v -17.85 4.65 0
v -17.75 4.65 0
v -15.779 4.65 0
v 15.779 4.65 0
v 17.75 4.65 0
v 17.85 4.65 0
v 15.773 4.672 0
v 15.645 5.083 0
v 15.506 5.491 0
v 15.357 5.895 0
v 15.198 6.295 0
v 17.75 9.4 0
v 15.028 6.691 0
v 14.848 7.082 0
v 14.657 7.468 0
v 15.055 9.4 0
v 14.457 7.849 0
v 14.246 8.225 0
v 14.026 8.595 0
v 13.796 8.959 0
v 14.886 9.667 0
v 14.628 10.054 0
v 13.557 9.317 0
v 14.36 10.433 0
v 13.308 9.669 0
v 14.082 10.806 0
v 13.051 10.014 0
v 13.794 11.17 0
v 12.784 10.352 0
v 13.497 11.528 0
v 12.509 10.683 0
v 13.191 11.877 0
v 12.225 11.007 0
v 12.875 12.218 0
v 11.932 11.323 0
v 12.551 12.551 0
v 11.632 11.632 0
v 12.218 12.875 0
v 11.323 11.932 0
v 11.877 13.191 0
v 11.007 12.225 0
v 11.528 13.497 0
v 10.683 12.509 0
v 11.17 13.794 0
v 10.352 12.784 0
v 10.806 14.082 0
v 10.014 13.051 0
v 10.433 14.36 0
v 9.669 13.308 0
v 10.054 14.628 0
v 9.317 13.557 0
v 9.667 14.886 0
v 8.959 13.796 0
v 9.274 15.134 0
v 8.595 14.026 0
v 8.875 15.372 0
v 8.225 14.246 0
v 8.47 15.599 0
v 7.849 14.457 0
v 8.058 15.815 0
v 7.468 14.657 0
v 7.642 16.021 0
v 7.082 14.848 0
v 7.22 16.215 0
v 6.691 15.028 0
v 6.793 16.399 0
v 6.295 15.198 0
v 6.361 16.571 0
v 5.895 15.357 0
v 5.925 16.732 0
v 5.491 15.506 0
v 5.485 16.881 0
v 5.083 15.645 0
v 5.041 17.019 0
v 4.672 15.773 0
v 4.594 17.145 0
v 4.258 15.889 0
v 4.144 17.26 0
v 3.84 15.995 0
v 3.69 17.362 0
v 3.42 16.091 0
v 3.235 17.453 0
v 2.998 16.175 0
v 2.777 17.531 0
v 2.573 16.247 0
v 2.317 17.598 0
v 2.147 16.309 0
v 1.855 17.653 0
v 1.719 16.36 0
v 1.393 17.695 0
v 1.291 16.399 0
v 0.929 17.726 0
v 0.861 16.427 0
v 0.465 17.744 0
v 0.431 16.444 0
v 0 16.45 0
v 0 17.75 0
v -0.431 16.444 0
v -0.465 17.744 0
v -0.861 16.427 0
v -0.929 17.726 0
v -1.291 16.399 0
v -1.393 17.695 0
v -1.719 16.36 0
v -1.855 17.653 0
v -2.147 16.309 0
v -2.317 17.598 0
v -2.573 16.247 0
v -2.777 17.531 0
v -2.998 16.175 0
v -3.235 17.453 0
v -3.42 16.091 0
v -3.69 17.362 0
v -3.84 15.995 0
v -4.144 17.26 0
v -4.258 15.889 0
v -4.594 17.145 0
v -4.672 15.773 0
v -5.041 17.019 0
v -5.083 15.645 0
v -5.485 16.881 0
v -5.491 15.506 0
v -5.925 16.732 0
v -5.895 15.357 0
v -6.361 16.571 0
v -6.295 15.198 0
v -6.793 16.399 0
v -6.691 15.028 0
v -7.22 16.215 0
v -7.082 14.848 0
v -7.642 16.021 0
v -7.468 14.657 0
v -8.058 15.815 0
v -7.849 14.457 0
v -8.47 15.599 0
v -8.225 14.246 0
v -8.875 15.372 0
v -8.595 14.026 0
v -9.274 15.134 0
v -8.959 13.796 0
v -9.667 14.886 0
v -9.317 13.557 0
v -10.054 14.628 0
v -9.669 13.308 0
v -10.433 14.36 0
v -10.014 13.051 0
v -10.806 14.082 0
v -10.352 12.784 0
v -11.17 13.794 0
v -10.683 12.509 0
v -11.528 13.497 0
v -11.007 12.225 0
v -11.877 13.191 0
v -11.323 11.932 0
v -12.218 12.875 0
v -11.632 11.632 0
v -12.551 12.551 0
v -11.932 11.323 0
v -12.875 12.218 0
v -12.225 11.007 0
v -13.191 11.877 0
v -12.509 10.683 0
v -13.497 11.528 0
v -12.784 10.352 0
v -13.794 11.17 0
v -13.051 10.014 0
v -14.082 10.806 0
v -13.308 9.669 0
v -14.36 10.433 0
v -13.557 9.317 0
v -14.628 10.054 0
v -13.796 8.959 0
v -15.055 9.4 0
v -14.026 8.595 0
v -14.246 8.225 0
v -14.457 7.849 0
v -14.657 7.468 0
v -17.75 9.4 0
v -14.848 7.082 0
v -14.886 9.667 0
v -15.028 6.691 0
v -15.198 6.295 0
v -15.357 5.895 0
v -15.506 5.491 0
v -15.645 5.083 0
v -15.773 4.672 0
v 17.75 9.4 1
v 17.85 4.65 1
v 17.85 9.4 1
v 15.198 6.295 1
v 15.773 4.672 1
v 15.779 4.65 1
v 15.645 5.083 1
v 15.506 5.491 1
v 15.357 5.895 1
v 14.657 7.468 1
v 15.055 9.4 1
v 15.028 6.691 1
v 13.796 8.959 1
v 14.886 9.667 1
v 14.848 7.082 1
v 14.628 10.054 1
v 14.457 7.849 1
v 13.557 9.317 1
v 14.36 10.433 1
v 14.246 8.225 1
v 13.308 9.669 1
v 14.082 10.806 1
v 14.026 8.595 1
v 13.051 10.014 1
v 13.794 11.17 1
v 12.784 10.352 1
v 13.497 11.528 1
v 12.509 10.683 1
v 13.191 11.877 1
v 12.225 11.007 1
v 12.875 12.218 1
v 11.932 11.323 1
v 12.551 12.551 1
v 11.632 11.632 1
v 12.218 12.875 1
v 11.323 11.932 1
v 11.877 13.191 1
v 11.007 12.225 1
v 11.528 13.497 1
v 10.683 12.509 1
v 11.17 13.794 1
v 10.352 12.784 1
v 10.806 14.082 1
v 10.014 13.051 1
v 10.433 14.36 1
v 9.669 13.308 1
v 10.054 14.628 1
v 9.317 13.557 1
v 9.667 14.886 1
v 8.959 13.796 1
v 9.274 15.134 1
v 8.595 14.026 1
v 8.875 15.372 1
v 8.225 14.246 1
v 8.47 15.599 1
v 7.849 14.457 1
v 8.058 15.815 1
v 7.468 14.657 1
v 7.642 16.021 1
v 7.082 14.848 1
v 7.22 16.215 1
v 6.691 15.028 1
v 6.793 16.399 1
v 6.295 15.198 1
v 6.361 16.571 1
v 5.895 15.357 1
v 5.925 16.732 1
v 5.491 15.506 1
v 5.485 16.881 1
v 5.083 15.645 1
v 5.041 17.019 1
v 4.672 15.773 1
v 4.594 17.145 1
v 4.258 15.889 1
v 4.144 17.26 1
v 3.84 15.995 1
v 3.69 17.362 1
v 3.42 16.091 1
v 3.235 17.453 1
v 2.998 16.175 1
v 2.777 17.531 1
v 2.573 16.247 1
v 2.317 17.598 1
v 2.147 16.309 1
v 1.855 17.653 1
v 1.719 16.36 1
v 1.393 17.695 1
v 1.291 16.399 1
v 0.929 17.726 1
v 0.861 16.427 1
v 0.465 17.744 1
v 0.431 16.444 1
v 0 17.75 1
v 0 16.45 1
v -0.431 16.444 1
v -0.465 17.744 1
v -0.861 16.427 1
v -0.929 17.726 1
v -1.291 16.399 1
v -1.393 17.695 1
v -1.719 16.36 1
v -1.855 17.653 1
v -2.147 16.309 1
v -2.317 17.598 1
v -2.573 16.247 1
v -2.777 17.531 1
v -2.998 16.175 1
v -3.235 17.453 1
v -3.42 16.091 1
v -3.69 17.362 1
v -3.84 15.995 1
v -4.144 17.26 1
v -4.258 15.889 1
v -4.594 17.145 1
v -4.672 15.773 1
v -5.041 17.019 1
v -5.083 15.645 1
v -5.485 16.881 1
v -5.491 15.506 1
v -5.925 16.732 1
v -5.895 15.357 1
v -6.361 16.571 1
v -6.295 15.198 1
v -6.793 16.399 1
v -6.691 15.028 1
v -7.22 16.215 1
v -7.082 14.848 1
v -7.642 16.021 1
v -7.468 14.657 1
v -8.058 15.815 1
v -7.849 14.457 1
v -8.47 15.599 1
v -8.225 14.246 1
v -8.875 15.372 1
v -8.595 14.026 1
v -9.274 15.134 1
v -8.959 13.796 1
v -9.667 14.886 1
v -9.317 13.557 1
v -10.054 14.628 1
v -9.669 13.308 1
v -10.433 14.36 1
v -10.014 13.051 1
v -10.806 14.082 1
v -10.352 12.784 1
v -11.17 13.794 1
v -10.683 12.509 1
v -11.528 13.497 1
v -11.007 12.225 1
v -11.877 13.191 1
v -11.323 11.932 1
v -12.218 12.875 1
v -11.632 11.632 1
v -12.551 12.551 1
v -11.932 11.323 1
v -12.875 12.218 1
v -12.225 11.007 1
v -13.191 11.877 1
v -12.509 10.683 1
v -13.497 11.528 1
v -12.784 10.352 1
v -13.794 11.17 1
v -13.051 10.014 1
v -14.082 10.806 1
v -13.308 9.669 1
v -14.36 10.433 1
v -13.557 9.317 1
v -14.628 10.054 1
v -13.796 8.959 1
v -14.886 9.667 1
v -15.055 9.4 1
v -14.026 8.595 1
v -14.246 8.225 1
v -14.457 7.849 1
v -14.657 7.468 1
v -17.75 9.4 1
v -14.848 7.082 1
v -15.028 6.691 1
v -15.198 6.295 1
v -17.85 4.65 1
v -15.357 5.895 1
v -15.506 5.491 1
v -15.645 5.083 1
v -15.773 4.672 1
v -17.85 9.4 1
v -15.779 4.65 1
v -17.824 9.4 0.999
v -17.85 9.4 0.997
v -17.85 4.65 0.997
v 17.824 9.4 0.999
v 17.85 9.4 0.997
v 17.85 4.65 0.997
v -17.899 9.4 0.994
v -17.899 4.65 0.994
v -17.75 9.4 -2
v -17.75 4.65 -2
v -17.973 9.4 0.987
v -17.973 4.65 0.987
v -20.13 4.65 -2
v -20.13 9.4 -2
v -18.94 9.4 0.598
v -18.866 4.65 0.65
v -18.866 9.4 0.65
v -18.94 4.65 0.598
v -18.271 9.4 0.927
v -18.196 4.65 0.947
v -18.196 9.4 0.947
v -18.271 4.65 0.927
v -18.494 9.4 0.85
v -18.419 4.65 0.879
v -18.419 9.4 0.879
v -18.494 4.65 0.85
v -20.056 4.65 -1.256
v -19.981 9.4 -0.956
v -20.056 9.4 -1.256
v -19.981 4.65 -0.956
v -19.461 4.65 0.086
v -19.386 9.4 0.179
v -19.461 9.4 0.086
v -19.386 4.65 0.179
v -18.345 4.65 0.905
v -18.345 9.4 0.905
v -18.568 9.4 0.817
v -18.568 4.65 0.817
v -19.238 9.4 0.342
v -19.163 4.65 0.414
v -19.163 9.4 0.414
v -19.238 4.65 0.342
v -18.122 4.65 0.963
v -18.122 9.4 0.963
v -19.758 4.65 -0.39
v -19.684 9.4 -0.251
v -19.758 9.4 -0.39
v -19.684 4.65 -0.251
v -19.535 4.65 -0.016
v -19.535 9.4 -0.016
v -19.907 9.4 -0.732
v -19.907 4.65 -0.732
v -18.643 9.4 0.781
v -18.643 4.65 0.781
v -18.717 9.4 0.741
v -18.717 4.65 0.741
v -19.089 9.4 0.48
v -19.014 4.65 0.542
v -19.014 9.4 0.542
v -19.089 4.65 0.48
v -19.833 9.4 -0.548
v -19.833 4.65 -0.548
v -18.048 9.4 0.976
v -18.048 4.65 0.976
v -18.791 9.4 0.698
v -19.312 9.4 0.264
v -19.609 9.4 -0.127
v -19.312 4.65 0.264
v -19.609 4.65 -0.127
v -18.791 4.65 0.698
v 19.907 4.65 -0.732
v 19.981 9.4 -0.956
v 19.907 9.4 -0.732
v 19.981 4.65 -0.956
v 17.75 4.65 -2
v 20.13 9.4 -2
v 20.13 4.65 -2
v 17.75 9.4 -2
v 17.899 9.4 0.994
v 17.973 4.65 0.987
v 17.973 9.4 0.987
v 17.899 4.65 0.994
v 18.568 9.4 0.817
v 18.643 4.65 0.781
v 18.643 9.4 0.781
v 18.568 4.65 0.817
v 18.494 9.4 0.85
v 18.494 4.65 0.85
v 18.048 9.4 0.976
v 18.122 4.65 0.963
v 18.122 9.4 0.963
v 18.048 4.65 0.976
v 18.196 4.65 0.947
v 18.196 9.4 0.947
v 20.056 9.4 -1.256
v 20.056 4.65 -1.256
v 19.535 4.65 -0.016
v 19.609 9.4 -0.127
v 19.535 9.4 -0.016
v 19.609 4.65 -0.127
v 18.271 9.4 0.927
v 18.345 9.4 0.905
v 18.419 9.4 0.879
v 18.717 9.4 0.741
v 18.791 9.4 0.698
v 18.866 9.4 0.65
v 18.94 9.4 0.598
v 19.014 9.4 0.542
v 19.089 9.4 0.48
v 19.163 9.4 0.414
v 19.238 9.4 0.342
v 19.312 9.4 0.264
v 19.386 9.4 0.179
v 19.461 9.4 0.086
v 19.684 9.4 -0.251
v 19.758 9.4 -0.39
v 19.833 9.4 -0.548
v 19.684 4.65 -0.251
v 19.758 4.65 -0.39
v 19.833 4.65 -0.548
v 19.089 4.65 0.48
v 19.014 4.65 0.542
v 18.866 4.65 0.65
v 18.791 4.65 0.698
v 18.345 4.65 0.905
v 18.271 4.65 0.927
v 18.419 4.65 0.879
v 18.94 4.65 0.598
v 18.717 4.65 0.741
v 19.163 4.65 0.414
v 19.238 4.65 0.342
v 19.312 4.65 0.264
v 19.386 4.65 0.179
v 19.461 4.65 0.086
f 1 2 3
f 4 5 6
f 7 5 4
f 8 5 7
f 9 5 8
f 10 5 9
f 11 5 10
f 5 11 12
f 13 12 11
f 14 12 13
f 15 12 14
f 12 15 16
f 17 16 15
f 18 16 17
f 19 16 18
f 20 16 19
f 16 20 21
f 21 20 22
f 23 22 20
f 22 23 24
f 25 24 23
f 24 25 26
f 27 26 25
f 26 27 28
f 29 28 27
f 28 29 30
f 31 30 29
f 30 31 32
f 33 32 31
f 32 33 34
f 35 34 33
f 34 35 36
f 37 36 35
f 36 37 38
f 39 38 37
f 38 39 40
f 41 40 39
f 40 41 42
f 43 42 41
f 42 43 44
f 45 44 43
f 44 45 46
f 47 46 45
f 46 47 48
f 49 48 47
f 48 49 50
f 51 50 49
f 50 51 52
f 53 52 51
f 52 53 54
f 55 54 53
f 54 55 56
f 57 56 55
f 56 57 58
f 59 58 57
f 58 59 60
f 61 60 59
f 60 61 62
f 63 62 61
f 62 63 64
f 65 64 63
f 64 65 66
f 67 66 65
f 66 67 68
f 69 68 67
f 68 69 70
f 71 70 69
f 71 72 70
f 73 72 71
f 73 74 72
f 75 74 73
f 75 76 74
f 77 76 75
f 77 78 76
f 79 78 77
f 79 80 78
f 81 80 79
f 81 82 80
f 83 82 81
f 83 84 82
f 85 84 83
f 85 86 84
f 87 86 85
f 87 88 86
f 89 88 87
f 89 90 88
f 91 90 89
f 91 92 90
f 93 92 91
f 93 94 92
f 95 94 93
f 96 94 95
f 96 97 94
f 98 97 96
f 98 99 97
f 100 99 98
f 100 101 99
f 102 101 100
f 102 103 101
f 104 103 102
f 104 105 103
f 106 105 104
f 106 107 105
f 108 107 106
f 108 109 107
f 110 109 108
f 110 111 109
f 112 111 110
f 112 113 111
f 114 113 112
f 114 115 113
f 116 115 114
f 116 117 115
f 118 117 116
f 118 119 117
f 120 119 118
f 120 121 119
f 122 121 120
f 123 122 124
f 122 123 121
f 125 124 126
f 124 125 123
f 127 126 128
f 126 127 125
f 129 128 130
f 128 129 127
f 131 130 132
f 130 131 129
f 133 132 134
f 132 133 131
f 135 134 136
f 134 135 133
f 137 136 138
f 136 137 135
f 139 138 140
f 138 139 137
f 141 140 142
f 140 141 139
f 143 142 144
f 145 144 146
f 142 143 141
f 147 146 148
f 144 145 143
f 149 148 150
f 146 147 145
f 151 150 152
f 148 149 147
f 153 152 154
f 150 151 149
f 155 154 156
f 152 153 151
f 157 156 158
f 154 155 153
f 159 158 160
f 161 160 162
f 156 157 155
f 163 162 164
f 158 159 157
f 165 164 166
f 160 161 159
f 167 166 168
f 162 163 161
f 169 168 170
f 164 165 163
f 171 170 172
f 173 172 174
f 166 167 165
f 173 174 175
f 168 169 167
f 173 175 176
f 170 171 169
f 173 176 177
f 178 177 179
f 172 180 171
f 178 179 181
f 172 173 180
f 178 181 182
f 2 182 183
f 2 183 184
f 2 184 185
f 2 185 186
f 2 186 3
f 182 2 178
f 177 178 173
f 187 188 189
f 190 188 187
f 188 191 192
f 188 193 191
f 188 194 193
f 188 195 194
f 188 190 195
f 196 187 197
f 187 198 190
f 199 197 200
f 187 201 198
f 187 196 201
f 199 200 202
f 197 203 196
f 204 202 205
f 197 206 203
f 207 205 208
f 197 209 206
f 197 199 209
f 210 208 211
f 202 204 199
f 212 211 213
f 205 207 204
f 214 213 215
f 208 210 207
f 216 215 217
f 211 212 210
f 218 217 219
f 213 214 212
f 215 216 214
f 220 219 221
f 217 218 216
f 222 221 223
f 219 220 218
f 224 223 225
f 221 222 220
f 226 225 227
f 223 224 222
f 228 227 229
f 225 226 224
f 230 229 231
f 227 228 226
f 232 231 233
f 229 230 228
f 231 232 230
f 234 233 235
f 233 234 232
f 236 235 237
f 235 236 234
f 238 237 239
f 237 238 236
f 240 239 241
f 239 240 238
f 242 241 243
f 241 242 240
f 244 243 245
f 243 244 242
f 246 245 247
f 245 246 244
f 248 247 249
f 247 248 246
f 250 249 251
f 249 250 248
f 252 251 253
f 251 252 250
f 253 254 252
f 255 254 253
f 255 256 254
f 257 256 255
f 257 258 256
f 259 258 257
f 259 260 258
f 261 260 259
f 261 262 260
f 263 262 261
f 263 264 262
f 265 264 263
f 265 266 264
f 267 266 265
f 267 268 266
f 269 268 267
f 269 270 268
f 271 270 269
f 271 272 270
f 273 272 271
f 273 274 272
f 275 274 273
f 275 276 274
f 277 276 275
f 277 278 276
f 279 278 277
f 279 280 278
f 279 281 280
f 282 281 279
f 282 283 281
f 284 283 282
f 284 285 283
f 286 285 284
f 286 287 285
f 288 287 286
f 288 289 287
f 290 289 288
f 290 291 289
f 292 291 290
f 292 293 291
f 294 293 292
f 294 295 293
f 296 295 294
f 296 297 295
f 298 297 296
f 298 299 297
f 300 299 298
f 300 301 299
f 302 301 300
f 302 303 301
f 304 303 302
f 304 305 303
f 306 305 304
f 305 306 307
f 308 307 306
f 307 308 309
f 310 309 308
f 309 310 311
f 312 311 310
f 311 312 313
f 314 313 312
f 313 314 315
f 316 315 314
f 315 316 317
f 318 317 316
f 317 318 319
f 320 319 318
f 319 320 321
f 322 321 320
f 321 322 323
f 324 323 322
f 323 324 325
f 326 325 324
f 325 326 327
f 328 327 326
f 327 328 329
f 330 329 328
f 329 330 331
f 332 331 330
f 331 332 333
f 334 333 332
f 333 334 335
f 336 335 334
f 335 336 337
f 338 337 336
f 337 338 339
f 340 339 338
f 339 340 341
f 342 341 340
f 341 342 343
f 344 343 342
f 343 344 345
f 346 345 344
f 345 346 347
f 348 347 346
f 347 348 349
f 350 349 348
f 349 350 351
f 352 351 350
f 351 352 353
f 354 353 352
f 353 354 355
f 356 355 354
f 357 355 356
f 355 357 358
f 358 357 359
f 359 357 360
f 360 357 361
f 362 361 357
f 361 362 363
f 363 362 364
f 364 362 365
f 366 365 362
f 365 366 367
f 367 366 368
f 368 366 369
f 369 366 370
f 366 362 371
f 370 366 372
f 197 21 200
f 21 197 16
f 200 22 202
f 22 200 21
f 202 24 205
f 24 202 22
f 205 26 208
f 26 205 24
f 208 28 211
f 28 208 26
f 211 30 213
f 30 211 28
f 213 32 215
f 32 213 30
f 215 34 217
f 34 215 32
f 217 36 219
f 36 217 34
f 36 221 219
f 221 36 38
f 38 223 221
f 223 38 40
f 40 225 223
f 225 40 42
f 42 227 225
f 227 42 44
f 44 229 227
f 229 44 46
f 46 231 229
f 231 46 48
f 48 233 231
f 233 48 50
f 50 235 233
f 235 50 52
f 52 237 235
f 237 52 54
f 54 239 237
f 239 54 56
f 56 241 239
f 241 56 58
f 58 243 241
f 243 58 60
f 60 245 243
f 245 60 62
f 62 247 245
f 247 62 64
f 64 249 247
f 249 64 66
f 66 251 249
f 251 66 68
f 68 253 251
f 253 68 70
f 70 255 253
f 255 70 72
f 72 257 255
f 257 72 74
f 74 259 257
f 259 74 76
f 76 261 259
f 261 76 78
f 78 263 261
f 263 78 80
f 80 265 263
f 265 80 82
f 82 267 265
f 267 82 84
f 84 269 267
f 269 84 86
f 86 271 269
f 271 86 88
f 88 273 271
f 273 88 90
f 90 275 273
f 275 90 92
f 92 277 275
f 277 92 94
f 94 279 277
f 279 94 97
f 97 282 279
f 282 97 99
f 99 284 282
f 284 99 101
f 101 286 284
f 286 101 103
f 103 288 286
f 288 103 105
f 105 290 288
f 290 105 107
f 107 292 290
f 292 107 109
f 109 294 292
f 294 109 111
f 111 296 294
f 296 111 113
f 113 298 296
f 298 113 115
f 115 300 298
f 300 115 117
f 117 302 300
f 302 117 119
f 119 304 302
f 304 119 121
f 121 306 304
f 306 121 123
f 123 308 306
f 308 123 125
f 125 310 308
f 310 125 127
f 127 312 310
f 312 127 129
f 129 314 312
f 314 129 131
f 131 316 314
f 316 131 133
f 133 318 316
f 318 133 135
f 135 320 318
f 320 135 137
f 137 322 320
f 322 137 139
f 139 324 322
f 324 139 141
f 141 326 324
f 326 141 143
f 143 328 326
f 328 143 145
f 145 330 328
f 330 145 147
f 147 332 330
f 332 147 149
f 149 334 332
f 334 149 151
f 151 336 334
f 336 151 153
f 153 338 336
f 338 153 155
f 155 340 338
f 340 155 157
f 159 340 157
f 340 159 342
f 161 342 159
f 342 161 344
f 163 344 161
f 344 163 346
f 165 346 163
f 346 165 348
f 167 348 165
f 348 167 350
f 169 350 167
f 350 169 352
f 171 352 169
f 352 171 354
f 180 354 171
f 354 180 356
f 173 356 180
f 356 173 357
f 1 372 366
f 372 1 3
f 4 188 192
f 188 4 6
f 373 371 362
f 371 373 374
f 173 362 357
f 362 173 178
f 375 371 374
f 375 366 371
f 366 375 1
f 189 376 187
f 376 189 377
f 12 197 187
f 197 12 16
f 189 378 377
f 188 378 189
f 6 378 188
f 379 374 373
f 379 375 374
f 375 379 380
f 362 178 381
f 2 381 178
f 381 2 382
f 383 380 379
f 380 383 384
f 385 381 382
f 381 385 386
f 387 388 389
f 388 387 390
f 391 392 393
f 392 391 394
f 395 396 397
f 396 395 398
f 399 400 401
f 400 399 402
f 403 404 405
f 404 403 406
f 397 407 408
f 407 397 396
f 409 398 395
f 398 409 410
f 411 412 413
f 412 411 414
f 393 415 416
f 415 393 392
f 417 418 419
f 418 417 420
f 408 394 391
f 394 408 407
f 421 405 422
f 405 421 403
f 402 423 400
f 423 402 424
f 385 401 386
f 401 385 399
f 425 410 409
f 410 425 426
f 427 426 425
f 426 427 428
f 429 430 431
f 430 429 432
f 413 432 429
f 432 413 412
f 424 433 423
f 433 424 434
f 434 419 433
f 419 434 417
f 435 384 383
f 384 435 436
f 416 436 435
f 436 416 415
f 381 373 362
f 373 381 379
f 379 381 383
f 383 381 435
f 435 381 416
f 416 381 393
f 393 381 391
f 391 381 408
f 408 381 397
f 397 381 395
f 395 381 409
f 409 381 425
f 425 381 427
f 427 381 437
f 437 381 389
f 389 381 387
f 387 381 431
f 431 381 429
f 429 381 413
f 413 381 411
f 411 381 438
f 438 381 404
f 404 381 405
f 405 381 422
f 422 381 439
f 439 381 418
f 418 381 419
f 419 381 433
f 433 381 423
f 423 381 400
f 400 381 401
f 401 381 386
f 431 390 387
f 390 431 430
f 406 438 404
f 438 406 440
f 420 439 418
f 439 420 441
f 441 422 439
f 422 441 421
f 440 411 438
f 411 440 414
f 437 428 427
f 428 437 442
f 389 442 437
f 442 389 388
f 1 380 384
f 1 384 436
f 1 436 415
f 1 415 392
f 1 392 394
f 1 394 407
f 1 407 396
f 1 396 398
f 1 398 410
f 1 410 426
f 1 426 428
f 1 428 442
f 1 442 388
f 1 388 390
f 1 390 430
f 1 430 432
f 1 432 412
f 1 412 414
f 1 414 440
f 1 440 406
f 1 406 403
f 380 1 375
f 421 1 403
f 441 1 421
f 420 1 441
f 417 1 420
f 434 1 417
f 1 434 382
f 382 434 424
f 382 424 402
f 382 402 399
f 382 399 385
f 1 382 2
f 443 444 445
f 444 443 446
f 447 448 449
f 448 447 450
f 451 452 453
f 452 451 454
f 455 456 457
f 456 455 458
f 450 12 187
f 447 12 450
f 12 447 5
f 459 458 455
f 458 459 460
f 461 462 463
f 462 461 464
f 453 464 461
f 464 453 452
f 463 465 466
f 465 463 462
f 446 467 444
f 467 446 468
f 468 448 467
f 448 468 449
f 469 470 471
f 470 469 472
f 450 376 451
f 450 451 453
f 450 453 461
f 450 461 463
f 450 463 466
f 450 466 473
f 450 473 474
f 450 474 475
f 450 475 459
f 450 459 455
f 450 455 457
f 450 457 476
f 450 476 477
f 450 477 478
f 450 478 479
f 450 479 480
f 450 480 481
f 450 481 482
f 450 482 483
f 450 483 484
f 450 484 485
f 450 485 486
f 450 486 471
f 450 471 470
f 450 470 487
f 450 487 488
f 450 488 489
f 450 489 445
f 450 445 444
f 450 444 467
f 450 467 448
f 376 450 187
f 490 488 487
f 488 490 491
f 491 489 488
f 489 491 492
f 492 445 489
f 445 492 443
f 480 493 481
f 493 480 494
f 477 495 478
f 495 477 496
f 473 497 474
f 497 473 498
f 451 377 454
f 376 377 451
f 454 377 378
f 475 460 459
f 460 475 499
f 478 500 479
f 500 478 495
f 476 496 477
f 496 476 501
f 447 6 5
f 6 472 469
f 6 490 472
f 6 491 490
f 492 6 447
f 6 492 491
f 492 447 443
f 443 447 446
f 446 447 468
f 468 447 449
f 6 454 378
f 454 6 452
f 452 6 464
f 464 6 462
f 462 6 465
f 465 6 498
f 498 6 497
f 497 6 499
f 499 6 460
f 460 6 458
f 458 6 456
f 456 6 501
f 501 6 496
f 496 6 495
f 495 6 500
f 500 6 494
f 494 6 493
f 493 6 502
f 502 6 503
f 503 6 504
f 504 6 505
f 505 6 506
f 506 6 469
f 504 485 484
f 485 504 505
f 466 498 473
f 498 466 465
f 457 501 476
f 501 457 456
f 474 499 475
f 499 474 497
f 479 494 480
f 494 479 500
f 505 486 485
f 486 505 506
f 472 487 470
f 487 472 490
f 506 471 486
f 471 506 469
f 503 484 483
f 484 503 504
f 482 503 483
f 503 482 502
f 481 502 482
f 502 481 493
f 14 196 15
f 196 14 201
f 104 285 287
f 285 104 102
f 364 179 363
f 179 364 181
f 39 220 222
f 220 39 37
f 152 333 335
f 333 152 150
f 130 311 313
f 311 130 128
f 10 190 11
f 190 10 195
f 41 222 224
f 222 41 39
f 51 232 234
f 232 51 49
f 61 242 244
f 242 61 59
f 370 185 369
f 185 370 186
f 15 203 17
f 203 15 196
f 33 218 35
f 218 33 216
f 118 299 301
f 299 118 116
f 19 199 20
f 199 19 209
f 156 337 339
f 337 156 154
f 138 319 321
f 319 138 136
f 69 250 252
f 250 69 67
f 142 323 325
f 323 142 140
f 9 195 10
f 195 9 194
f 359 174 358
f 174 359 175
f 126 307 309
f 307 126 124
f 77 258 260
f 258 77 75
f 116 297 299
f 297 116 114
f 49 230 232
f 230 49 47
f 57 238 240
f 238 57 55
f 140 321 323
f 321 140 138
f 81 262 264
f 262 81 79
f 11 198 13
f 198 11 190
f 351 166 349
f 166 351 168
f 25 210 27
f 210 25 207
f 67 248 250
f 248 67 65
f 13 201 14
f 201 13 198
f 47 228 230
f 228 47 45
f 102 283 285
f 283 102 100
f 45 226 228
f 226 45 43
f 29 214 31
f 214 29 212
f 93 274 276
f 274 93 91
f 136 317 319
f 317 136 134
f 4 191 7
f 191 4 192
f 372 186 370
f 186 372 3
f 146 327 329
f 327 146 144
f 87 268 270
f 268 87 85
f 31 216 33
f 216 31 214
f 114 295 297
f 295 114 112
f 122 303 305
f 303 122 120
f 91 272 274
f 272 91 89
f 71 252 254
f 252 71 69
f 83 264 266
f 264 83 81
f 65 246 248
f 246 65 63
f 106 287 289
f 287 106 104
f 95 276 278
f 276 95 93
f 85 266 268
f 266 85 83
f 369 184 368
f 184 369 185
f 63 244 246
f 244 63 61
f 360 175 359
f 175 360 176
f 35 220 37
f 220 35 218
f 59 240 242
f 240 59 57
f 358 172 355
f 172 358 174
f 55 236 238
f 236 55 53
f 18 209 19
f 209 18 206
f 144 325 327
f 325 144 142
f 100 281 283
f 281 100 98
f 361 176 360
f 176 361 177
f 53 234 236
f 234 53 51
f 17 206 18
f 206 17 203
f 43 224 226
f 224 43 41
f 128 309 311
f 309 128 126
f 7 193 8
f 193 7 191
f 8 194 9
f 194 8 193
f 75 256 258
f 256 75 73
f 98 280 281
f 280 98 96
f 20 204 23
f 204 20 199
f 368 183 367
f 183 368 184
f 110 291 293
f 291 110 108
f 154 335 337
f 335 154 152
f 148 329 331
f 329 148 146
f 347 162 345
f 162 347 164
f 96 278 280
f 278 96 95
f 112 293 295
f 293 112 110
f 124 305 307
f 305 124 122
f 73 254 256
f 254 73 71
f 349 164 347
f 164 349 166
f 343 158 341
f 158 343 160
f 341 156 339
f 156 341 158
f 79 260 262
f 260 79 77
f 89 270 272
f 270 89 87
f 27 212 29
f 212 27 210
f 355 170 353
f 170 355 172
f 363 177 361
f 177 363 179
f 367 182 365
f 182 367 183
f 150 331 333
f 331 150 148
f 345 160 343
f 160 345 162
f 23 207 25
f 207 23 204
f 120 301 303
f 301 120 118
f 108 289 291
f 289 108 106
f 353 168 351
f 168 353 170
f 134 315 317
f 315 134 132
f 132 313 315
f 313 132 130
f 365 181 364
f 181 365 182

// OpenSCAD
// Two-piece watch bezel replacement.
// All dimensions are millimeters.

$fn = 240;

inner_diameter = 32.9;
radial_clearance = 0.0;
rim_width = 1.3;
side_gap = 9.3;
end_width = 4.75;
end_extension = 3.0;
body_thickness = 1.0;
end_drop = 2.0;
terminal_shoulder_span = 35.5;

// 0 = upper half, 1 = lower half, 2 = installed assembly.
render_mode = 0;

inner_radius = inner_diameter / 2 + radial_clearance;
outer_radius = inner_radius + rim_width;
gap_half = side_gap / 2;
circular_end_x = sqrt(outer_radius * outer_radius - gap_half * gap_half);
tip_x = circular_end_x + end_extension;
terminal_start_x = terminal_shoulder_span / 2;
terminal_length = tip_x - terminal_start_x;
connector_top_y = gap_half + end_width;
connector_circle_x = sqrt(
    outer_radius * outer_radius - connector_top_y * connector_top_y
);

terminal_segments = 32;
epsilon = 0.02;
connector_overlap = 0.10;

function terminal_top(value) =
    -end_drop
    + (body_thickness + end_drop) * sqrt(1 - value * value);
function terminal_profile_points() = concat(
    [
        [terminal_start_x, -end_drop],
        [tip_x, -end_drop]
    ],
    [
        for (index = [terminal_segments - 1 : -1 : 0])
            let(
                path_fraction = index / terminal_segments,
                x_position = terminal_start_x + terminal_length * path_fraction
            )
            [x_position, terminal_top(path_fraction)]
    ]
);

module upper_ring_2d() {
    intersection() {
        difference() {
            circle(r = outer_radius);
            circle(r = inner_radius);
        }

        translate([-outer_radius - epsilon, gap_half])
            square([
                2 * (outer_radius + epsilon),
                outer_radius - gap_half + epsilon
            ]);
    }
}

module terminal(side) {
    if (side > 0) {
        translate([0, connector_top_y, 0])
            rotate([90, 0, 0])
                linear_extrude(height = end_width, convexity = 10)
                    polygon(points = terminal_profile_points());
    } else {
        mirror([1, 0, 0])
            translate([0, connector_top_y, 0])
                rotate([90, 0, 0])
                    linear_extrude(height = end_width, convexity = 10)
                        polygon(points = terminal_profile_points());
    }
}

module end_connector_2d(side) {
    connector_points = [
        [circular_end_x - connector_overlap, gap_half],
        [terminal_start_x + connector_overlap, gap_half],
        [terminal_start_x + connector_overlap, connector_top_y],
        [connector_circle_x - connector_overlap, connector_top_y]
    ];

    if (side > 0) {
        polygon(points = connector_points);
    } else {
        mirror([1, 0, 0])
            polygon(points = connector_points);
    }
}

module upper_half() {
    difference() {
        union() {
            linear_extrude(height = body_thickness)
                upper_ring_2d();
            linear_extrude(height = body_thickness) {
                end_connector_2d(-1);
                end_connector_2d(1);
            }
            terminal(-1);
            terminal(1);
        }

        translate([0, 0, -end_drop - 1])
            cylinder(
                r = inner_radius,
                h = end_drop + body_thickness + 2
            );
    }
}

module lower_half() {
    mirror([0, 1, 0])
        upper_half();
}

module assembly() {
    upper_half();
    lower_half();
}

if (render_mode == 0) {
    upper_half();
} else if (render_mode == 1) {
    lower_half();
} else if (render_mode == 2) {
    assembly();
}
